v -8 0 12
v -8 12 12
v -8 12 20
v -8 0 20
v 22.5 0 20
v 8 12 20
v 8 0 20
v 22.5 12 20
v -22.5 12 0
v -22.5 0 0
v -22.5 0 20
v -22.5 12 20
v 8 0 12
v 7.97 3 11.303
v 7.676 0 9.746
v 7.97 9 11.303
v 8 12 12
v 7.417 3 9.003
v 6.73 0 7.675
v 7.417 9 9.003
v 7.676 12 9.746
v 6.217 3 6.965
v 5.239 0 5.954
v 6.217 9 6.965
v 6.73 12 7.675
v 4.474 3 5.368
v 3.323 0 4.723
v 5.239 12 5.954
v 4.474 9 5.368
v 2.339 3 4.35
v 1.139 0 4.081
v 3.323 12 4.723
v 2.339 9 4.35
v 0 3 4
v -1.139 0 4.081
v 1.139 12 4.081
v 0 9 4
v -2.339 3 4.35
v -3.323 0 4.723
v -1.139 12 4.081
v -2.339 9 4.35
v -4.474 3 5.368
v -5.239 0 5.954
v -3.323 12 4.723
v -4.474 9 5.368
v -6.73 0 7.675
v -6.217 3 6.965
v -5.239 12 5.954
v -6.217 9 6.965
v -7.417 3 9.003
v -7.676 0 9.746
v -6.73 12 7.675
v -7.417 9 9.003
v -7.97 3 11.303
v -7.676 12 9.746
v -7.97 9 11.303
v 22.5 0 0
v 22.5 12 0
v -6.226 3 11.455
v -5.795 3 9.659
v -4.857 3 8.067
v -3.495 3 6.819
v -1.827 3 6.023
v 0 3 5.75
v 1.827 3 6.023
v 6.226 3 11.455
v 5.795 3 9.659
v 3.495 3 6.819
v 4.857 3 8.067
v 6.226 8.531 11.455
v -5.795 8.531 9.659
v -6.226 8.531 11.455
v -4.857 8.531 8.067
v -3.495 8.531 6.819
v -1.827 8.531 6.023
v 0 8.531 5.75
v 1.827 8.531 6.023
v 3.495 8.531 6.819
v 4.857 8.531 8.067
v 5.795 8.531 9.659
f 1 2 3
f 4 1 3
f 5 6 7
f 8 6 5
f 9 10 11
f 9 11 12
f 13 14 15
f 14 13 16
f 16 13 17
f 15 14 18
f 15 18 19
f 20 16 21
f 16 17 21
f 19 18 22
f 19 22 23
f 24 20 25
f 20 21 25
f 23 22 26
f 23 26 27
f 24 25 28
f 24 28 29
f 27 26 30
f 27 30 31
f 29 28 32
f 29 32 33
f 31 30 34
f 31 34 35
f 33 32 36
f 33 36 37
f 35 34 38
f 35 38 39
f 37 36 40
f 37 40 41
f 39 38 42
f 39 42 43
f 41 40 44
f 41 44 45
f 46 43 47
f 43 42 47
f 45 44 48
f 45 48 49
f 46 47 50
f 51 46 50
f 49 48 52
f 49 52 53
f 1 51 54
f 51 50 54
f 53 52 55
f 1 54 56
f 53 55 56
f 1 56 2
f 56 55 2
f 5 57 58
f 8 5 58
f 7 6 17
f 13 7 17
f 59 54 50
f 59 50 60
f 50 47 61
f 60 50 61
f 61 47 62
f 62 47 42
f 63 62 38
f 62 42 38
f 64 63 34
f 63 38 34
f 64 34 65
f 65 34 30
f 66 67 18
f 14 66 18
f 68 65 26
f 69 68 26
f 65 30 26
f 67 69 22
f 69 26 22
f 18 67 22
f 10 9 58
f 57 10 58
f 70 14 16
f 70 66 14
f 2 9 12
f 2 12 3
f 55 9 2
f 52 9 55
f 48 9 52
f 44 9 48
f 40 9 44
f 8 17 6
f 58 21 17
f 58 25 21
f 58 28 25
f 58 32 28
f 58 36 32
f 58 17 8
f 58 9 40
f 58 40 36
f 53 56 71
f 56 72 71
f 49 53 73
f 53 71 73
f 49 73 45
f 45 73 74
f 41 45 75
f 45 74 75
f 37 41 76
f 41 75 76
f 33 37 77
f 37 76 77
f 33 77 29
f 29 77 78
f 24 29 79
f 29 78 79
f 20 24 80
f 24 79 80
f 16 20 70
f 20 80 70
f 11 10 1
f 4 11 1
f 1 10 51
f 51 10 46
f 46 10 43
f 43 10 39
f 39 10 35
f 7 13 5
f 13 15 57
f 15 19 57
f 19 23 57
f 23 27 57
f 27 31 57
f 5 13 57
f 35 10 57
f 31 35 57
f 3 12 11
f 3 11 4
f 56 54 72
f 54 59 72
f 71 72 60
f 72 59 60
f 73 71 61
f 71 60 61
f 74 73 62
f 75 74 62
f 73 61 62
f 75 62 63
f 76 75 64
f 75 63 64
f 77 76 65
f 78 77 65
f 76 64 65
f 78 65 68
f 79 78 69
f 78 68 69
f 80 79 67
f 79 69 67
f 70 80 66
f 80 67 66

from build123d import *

# Parameters (mm, degrees)
F0_W          = 45
F0_H          = 12
F1_DEPTH      = 20
F3_DEPTH      = 12.001
F5_ANGLE_BACK = 85
F5_ANGLE      = 170


with BuildPart() as f1:
    # F0 (on Top) → F1 (new body)
    with BuildSketch(Plane.XY):
        with Locations((0, 6)):
            Rectangle(F0_W, F0_H)
    extrude(amount=F1_DEPTH)

    # F2 (on face) → F3 (cut, through all)
    with BuildSketch(Plane(origin=(0, 12, 0), x_dir=(-1, 0, 0), z_dir=(0, 1, 0))):
        with BuildLine():
            ThreePointArc((-8, 12), (0, 4), (8, 12))
            Line((8, 12), (8, 20))
            Line((8, 20), (-8, 20))
            Line((-8, 20), (-8, 12))
        make_face()
    extrude(amount=-F3_DEPTH, mode=Mode.SUBTRACT)

    # F4 (on Right) → F5 (revolve)
    with BuildSketch(Plane.YZ, mode=Mode.PRIVATE) as f5_sk:
        Polygon((3, 4), (9, 4), (8.5310889132, 5.75), (3, 5.75), align=None)
    revolve(f5_sk.sketch.rotate(Axis((0, 6, 12), (0, -1, 0)), -F5_ANGLE_BACK), axis=Axis((0, 6, 12), (0, -1, 0)), revolution_arc=F5_ANGLE)


solid = f1.part
